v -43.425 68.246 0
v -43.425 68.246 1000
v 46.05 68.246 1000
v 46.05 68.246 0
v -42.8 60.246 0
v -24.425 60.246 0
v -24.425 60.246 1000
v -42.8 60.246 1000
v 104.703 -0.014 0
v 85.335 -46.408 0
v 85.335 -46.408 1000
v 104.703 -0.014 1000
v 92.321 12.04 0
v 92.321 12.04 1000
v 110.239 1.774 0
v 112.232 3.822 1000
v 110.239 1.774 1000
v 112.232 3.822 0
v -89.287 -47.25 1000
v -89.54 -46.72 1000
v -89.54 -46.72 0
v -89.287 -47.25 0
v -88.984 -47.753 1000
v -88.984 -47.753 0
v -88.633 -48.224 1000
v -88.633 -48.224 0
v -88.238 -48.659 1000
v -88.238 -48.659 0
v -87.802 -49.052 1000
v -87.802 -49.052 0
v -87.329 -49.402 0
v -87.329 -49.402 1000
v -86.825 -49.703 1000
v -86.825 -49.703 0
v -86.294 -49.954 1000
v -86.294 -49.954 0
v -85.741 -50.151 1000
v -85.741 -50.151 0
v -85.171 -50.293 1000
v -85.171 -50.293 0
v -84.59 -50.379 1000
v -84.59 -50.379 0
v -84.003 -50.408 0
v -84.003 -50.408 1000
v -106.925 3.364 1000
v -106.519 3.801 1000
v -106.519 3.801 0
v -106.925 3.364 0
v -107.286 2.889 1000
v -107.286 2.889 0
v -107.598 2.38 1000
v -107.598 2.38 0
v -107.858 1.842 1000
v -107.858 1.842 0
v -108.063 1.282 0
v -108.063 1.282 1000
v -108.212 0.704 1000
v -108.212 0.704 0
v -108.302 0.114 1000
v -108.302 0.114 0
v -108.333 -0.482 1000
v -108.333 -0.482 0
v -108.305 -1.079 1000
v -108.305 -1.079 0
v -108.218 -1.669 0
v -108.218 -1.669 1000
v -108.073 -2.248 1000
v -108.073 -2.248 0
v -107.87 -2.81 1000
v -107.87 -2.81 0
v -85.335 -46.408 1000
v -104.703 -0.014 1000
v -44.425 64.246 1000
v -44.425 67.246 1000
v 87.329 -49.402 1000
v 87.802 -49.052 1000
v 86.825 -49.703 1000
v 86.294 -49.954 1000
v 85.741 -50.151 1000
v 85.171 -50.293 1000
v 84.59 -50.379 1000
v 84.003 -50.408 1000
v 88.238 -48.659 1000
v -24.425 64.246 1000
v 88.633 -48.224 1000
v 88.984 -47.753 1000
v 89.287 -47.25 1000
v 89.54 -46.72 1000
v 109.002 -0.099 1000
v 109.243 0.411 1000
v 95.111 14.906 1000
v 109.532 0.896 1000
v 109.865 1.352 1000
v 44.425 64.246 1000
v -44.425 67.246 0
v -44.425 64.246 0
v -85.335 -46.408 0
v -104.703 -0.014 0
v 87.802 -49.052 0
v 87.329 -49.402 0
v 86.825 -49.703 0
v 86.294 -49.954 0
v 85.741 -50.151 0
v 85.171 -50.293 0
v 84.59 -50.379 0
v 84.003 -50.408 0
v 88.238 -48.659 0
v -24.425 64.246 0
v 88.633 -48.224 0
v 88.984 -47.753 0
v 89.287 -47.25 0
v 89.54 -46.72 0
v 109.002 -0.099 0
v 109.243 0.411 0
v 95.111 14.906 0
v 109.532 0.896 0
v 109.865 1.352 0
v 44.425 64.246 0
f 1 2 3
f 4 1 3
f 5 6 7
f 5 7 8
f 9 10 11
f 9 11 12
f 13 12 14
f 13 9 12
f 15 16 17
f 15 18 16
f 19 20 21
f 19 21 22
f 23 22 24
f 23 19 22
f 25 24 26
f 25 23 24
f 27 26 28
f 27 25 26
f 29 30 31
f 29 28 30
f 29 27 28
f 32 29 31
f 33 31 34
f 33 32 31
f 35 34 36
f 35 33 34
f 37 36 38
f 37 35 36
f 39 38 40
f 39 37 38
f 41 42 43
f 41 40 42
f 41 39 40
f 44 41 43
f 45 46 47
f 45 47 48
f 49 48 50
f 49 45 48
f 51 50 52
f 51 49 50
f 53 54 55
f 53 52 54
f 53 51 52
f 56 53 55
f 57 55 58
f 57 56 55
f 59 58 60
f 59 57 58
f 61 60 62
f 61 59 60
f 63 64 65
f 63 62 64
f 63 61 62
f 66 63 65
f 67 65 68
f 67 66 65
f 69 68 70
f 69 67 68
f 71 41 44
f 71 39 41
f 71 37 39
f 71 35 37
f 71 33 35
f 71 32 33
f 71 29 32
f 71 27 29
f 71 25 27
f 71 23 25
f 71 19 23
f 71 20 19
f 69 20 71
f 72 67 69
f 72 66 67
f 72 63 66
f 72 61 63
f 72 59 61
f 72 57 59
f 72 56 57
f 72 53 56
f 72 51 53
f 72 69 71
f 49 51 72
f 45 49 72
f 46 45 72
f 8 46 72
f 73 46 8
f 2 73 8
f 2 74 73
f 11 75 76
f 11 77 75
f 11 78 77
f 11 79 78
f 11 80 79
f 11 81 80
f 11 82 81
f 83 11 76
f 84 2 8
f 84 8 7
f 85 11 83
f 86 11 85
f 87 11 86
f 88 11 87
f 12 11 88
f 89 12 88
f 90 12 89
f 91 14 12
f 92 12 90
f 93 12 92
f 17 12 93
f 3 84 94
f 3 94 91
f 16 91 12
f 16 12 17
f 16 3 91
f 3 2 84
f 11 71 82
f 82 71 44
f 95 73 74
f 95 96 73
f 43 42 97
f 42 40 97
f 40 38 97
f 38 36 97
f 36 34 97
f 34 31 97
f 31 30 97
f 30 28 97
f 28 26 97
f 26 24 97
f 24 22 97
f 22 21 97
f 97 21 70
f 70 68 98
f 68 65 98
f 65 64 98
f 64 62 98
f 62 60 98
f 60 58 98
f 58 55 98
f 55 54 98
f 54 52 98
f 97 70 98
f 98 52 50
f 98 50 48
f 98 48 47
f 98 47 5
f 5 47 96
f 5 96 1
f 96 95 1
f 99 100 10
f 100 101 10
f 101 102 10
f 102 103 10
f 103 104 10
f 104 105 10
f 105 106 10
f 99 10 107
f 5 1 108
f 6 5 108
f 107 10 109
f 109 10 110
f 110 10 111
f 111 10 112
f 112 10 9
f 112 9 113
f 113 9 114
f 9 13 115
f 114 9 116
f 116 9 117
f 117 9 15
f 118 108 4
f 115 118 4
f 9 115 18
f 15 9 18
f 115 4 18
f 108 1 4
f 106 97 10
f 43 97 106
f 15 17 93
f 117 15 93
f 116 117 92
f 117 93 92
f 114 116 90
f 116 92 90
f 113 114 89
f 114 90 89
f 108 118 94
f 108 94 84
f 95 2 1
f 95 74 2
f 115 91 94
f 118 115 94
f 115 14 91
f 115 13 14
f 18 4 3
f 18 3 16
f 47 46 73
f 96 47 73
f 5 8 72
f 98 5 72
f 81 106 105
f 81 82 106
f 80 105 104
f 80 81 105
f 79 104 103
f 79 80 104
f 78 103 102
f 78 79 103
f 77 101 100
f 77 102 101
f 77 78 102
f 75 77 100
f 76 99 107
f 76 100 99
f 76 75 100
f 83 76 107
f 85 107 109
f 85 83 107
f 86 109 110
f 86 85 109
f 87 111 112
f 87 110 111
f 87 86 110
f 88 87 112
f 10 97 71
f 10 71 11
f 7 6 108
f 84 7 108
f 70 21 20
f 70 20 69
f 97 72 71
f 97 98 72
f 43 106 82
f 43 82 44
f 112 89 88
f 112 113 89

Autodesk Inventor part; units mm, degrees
ref_plane "YZ Plane" through (0, 0, 0) normal (1, 0, 0) x (0, 1, 0)
ref_plane "XZ Plane" through (0, 0, 0) normal (0, 1, 0) x (-1, 0, 0)
ref_plane "XY Plane" through (0, 0, 0) normal (0, 0, 1) x (1, 0, 0)
sketch "Sketch1" plane through (0, 0, 0) normal (0, 0, 1) x (1, 0, 0)
  arc A0 (-6.0005, 54.2016) -> (-16.0004, 64.2461) centre (-16.0004, 54.2461) ccw construction
  line L0 (-16.0004, 64.2461) -> (-44.425, 64.2461) construction
  line L1 (-44.425, 64.2461) -> (-109.442, 0.9553) construction
  line L2 (-109.442, 0.9553) -> (-102.1149, -16.5964) construction
  arc A1 (-102.1149, -16.5964) -> (-98.2137, -18.2187) centre (-99.3465, -15.4407) ccw construction
  arc A2 (-98.2137, -18.2187) -> (-94.934, -16.1156) centre (-102.2552, -8.3072) ccw construction
  arc A3 (-90.1342, -27.6135) -> (-94.934, -16.1156) centre (-85.3155, -18.8511) ccw construction
  arc A4 (-90.1342, -27.6135) -> (-93.9357, -28.4666) centre (-89.7305, -38.3096) ccw construction
  arc A5 (-93.9357, -28.4666) -> (-95.5255, -32.381) centre (-92.7571, -31.2253) ccw construction
  line L3 (-95.5255, -32.381) -> (-88, -50.4082) construction
  line L4 (-88, -50.4082) -> (88, -50.4082) construction
  line L5 (88, -50.4082) -> (95.5255, -32.381) construction
  arc A6 (95.5255, -32.381) -> (93.9357, -28.4666) centre (92.7571, -31.2253) ccw construction
  arc A7 (93.9357, -28.4666) -> (90.1342, -27.6135) centre (89.7305, -38.3096) ccw construction
  arc A8 (94.934, -16.1156) -> (90.1342, -27.6135) centre (85.3155, -18.8511) ccw construction
  arc A9 (94.934, -16.1156) -> (98.2137, -18.2187) centre (102.2552, -8.3072) ccw construction
  arc A10 (98.2137, -18.2187) -> (102.1149, -16.5964) centre (99.3465, -15.4407) ccw construction
  line L6 (102.1149, -16.5964) -> (109.442, 0.9553) construction
  line L7 (109.442, 0.9553) -> (44.425, 64.2461) construction
  line L8 (44.425, 64.2461) -> (16.0004, 64.2461) construction
  arc A11 (16.0004, 64.2461) -> (6.0005, 54.2016) centre (16.0004, 54.2461) ccw construction
  arc A12 (6.0005, 54.2016) -> (6.0352, 52.5653) centre (54.7865, 54.419) ccw construction
  arc A13 (-6.0352, 52.5653) -> (6.0352, 52.5653) centre (0, 44.5918) ccw construction
  arc A14 (-6.0352, 52.5653) -> (-6.0005, 54.2016) centre (-54.7865, 54.419) ccw construction
  line L9 (109.442, 0.9553) -> (88, -50.4082)
  line L10 (88, -50.4082) -> (-88, -50.4082)
  line L11 (-88, -50.4082) -> (-109.442, 0.9553)
  line L12 (-109.442, 0.9553) -> (-44.425, 64.2461)
  line L13 (-44.425, 64.2461) -> (-24.425, 64.2461)
  line L14 (109.442, 0.9553) -> (95.1109, 14.9059)
  line L15 (-24.425, 60.2461) -> (-42.7995, 60.2461)
  line L16 (-42.7995, 60.2461) -> (-104.7029, -0.0138)
  line L17 (-104.7029, -0.0138) -> (-85.3353, -46.4082)
  line L18 (-85.3353, -46.4082) -> (85.3353, -46.4082)
  line L19 (85.3353, -46.4082) -> (104.7029, -0.0138)
  line L20 (104.7029, -0.0138) -> (92.3208, 12.0397)
  line L21 (92.3208, 12.0397) -> (95.1109, 14.9059)
  line L22 (-24.425, 60.2461) -> (-24.425, 64.2461)
  point P0 (0, 0)
  dimension "d1" = 20
  dimension "d2" = 20
  dimension "d3" = 4
extrude "Extrusion1" add sketch "Sketch1" along normal blind 1000
ref_plane "Work Plane1" through (0, 0, 0) normal (0, 0, 1) x (1, 0, 0)
sketch "Sketch2" plane through (0, 0, 0) normal (0, 0, 1) x (1, 0, 0)
  line L0 (109.442, 0.9553) -> (44.425, 64.2461) construction
  line L1 (-16.0004, 64.2461) -> (-44.425, 64.2461) projected
  line L2 (-44.425, 64.2461) -> (-109.442, 0.9553) projected
  line L3 (-109.442, 0.9553) -> (-88, -50.4082) projected
  line L4 (-88, -50.4082) -> (88, -50.4082) projected
  line L5 (88, -50.4082) -> (109.442, 0.9553) projected
  line L6 (109.442, 0.9553) -> (95.1109, 14.9059) projected
  line L7 (95.1109, 14.9059) -> (92.3208, 12.0397) projected
  line L8 (92.3208, 12.0397) -> (104.7029, -0.0138) projected
  line L9 (104.7029, -0.0138) -> (85.3353, -46.4082) projected
  line L10 (85.3353, -46.4082) -> (-85.3353, -46.4082) projected
  line L11 (-85.3353, -46.4082) -> (-104.7029, -0.0138) projected
  line L12 (-104.7029, -0.0138) -> (-42.7995, 60.2461) projected
  line L13 (-42.7995, 60.2461) -> (-24.425, 60.2461) projected
  line L14 (-24.425, 60.2461) -> (-24.425, 64.2461) projected
  line L15 (-24.425, 64.2461) -> (-44.425, 64.2461) projected
  line L16 (109.442, 0.9553) -> (44.425, 64.2461)
  line L17 (44.425, 64.2461) -> (-44.425, 64.2461)
  line L18 (-44.425, 68.2461) -> (46.0504, 68.2461)
  line L19 (46.0504, 68.2461) -> (112.2321, 3.8215)
  line L20 (-44.425, 64.2461) -> (-44.425, 68.2461)
  line L21 (112.2321, 3.8215) -> (109.442, 0.9553)
  point P0 (0, 0)
  dimension "d6" = 4
extrude "Extrusion2" add sketch "Sketch2" along normal blind 1000 contours L1 L20 L18 L19 L21 L6 L16 L17
fillet "Fillet1" radius 6 3 edges at (88, -50.4082, 500) (-88, -50.4082, 500) (-109.442, 0.9553, 500)
fillet "Fillet2" radius 6 1 edges at (109.442, 0.9553, 500)
chamfer "Chamfer1" distance 1 angle 45 1 edges at (-44.425, 68.2461, 500)
properties part number "aluco de metro" material "Steel, Carbon"
